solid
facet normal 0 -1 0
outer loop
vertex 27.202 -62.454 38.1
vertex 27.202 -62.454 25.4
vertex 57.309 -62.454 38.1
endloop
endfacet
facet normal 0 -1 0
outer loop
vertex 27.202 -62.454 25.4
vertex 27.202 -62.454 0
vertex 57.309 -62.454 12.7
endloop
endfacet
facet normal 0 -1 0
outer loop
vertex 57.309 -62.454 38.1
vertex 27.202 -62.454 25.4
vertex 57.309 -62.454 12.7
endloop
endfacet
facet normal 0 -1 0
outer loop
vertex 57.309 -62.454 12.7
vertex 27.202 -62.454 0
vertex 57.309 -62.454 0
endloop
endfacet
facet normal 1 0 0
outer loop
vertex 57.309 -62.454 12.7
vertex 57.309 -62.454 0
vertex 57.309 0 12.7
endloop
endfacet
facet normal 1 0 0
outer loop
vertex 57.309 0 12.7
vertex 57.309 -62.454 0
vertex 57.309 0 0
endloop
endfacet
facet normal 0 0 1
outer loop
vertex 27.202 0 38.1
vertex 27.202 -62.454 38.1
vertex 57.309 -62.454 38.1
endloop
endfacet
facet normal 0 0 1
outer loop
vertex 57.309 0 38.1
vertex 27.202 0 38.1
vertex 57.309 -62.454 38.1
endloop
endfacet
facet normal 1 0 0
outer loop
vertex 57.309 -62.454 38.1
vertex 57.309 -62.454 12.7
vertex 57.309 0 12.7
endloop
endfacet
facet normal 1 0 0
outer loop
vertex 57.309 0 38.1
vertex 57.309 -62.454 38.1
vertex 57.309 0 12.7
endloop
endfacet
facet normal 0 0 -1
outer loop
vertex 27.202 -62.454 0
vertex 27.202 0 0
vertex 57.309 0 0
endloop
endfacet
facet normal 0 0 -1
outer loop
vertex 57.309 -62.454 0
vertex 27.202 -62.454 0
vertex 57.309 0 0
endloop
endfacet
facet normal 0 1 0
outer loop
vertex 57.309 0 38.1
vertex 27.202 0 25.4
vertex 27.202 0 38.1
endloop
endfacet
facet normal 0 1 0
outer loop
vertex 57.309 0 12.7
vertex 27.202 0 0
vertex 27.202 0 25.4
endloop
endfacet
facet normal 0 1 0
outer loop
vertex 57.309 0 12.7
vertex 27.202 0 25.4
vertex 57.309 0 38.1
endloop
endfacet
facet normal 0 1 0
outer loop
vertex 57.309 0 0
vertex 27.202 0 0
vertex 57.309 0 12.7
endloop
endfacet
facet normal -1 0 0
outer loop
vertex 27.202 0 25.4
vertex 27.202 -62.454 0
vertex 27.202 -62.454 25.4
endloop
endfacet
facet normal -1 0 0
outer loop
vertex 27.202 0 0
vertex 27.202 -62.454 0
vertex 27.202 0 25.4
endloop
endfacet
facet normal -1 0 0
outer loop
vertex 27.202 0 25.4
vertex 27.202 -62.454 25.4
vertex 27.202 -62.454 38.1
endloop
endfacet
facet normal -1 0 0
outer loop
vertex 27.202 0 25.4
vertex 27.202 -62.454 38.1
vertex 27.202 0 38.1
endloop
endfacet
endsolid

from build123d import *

# Parameters (mm, degrees)
F0_W      = 30.106247
F0_H      = 62.454224
F1_DEPTH  = 12.7
F1_FACE_W = 30.106246
F1_FACE_H = 62.454224
F2_DEPTH  = 25.4


with BuildPart() as f1:
    # F0 (on Top) → F1 (new body)
    with BuildSketch(Plane.XY):
        with Locations((42.255565, -31.227112)):
            Rectangle(F0_W, F0_H)
    extrude(amount=F1_DEPTH)

    # F1_face (on face) + F0 (on Top) → F2 (join)
    with BuildSketch(Plane(origin=(42.255566, -31.227112, 12.7), x_dir=(1, 0, 0), z_dir=(0, 0, 1))):
        Rectangle(F1_FACE_W, F1_FACE_H)
    with BuildSketch(Plane.XY):
        with Locations((42.255565, -31.227112)):
            Rectangle(F0_W, F0_H)
    extrude(amount=F2_DEPTH)


solid = f1.part
